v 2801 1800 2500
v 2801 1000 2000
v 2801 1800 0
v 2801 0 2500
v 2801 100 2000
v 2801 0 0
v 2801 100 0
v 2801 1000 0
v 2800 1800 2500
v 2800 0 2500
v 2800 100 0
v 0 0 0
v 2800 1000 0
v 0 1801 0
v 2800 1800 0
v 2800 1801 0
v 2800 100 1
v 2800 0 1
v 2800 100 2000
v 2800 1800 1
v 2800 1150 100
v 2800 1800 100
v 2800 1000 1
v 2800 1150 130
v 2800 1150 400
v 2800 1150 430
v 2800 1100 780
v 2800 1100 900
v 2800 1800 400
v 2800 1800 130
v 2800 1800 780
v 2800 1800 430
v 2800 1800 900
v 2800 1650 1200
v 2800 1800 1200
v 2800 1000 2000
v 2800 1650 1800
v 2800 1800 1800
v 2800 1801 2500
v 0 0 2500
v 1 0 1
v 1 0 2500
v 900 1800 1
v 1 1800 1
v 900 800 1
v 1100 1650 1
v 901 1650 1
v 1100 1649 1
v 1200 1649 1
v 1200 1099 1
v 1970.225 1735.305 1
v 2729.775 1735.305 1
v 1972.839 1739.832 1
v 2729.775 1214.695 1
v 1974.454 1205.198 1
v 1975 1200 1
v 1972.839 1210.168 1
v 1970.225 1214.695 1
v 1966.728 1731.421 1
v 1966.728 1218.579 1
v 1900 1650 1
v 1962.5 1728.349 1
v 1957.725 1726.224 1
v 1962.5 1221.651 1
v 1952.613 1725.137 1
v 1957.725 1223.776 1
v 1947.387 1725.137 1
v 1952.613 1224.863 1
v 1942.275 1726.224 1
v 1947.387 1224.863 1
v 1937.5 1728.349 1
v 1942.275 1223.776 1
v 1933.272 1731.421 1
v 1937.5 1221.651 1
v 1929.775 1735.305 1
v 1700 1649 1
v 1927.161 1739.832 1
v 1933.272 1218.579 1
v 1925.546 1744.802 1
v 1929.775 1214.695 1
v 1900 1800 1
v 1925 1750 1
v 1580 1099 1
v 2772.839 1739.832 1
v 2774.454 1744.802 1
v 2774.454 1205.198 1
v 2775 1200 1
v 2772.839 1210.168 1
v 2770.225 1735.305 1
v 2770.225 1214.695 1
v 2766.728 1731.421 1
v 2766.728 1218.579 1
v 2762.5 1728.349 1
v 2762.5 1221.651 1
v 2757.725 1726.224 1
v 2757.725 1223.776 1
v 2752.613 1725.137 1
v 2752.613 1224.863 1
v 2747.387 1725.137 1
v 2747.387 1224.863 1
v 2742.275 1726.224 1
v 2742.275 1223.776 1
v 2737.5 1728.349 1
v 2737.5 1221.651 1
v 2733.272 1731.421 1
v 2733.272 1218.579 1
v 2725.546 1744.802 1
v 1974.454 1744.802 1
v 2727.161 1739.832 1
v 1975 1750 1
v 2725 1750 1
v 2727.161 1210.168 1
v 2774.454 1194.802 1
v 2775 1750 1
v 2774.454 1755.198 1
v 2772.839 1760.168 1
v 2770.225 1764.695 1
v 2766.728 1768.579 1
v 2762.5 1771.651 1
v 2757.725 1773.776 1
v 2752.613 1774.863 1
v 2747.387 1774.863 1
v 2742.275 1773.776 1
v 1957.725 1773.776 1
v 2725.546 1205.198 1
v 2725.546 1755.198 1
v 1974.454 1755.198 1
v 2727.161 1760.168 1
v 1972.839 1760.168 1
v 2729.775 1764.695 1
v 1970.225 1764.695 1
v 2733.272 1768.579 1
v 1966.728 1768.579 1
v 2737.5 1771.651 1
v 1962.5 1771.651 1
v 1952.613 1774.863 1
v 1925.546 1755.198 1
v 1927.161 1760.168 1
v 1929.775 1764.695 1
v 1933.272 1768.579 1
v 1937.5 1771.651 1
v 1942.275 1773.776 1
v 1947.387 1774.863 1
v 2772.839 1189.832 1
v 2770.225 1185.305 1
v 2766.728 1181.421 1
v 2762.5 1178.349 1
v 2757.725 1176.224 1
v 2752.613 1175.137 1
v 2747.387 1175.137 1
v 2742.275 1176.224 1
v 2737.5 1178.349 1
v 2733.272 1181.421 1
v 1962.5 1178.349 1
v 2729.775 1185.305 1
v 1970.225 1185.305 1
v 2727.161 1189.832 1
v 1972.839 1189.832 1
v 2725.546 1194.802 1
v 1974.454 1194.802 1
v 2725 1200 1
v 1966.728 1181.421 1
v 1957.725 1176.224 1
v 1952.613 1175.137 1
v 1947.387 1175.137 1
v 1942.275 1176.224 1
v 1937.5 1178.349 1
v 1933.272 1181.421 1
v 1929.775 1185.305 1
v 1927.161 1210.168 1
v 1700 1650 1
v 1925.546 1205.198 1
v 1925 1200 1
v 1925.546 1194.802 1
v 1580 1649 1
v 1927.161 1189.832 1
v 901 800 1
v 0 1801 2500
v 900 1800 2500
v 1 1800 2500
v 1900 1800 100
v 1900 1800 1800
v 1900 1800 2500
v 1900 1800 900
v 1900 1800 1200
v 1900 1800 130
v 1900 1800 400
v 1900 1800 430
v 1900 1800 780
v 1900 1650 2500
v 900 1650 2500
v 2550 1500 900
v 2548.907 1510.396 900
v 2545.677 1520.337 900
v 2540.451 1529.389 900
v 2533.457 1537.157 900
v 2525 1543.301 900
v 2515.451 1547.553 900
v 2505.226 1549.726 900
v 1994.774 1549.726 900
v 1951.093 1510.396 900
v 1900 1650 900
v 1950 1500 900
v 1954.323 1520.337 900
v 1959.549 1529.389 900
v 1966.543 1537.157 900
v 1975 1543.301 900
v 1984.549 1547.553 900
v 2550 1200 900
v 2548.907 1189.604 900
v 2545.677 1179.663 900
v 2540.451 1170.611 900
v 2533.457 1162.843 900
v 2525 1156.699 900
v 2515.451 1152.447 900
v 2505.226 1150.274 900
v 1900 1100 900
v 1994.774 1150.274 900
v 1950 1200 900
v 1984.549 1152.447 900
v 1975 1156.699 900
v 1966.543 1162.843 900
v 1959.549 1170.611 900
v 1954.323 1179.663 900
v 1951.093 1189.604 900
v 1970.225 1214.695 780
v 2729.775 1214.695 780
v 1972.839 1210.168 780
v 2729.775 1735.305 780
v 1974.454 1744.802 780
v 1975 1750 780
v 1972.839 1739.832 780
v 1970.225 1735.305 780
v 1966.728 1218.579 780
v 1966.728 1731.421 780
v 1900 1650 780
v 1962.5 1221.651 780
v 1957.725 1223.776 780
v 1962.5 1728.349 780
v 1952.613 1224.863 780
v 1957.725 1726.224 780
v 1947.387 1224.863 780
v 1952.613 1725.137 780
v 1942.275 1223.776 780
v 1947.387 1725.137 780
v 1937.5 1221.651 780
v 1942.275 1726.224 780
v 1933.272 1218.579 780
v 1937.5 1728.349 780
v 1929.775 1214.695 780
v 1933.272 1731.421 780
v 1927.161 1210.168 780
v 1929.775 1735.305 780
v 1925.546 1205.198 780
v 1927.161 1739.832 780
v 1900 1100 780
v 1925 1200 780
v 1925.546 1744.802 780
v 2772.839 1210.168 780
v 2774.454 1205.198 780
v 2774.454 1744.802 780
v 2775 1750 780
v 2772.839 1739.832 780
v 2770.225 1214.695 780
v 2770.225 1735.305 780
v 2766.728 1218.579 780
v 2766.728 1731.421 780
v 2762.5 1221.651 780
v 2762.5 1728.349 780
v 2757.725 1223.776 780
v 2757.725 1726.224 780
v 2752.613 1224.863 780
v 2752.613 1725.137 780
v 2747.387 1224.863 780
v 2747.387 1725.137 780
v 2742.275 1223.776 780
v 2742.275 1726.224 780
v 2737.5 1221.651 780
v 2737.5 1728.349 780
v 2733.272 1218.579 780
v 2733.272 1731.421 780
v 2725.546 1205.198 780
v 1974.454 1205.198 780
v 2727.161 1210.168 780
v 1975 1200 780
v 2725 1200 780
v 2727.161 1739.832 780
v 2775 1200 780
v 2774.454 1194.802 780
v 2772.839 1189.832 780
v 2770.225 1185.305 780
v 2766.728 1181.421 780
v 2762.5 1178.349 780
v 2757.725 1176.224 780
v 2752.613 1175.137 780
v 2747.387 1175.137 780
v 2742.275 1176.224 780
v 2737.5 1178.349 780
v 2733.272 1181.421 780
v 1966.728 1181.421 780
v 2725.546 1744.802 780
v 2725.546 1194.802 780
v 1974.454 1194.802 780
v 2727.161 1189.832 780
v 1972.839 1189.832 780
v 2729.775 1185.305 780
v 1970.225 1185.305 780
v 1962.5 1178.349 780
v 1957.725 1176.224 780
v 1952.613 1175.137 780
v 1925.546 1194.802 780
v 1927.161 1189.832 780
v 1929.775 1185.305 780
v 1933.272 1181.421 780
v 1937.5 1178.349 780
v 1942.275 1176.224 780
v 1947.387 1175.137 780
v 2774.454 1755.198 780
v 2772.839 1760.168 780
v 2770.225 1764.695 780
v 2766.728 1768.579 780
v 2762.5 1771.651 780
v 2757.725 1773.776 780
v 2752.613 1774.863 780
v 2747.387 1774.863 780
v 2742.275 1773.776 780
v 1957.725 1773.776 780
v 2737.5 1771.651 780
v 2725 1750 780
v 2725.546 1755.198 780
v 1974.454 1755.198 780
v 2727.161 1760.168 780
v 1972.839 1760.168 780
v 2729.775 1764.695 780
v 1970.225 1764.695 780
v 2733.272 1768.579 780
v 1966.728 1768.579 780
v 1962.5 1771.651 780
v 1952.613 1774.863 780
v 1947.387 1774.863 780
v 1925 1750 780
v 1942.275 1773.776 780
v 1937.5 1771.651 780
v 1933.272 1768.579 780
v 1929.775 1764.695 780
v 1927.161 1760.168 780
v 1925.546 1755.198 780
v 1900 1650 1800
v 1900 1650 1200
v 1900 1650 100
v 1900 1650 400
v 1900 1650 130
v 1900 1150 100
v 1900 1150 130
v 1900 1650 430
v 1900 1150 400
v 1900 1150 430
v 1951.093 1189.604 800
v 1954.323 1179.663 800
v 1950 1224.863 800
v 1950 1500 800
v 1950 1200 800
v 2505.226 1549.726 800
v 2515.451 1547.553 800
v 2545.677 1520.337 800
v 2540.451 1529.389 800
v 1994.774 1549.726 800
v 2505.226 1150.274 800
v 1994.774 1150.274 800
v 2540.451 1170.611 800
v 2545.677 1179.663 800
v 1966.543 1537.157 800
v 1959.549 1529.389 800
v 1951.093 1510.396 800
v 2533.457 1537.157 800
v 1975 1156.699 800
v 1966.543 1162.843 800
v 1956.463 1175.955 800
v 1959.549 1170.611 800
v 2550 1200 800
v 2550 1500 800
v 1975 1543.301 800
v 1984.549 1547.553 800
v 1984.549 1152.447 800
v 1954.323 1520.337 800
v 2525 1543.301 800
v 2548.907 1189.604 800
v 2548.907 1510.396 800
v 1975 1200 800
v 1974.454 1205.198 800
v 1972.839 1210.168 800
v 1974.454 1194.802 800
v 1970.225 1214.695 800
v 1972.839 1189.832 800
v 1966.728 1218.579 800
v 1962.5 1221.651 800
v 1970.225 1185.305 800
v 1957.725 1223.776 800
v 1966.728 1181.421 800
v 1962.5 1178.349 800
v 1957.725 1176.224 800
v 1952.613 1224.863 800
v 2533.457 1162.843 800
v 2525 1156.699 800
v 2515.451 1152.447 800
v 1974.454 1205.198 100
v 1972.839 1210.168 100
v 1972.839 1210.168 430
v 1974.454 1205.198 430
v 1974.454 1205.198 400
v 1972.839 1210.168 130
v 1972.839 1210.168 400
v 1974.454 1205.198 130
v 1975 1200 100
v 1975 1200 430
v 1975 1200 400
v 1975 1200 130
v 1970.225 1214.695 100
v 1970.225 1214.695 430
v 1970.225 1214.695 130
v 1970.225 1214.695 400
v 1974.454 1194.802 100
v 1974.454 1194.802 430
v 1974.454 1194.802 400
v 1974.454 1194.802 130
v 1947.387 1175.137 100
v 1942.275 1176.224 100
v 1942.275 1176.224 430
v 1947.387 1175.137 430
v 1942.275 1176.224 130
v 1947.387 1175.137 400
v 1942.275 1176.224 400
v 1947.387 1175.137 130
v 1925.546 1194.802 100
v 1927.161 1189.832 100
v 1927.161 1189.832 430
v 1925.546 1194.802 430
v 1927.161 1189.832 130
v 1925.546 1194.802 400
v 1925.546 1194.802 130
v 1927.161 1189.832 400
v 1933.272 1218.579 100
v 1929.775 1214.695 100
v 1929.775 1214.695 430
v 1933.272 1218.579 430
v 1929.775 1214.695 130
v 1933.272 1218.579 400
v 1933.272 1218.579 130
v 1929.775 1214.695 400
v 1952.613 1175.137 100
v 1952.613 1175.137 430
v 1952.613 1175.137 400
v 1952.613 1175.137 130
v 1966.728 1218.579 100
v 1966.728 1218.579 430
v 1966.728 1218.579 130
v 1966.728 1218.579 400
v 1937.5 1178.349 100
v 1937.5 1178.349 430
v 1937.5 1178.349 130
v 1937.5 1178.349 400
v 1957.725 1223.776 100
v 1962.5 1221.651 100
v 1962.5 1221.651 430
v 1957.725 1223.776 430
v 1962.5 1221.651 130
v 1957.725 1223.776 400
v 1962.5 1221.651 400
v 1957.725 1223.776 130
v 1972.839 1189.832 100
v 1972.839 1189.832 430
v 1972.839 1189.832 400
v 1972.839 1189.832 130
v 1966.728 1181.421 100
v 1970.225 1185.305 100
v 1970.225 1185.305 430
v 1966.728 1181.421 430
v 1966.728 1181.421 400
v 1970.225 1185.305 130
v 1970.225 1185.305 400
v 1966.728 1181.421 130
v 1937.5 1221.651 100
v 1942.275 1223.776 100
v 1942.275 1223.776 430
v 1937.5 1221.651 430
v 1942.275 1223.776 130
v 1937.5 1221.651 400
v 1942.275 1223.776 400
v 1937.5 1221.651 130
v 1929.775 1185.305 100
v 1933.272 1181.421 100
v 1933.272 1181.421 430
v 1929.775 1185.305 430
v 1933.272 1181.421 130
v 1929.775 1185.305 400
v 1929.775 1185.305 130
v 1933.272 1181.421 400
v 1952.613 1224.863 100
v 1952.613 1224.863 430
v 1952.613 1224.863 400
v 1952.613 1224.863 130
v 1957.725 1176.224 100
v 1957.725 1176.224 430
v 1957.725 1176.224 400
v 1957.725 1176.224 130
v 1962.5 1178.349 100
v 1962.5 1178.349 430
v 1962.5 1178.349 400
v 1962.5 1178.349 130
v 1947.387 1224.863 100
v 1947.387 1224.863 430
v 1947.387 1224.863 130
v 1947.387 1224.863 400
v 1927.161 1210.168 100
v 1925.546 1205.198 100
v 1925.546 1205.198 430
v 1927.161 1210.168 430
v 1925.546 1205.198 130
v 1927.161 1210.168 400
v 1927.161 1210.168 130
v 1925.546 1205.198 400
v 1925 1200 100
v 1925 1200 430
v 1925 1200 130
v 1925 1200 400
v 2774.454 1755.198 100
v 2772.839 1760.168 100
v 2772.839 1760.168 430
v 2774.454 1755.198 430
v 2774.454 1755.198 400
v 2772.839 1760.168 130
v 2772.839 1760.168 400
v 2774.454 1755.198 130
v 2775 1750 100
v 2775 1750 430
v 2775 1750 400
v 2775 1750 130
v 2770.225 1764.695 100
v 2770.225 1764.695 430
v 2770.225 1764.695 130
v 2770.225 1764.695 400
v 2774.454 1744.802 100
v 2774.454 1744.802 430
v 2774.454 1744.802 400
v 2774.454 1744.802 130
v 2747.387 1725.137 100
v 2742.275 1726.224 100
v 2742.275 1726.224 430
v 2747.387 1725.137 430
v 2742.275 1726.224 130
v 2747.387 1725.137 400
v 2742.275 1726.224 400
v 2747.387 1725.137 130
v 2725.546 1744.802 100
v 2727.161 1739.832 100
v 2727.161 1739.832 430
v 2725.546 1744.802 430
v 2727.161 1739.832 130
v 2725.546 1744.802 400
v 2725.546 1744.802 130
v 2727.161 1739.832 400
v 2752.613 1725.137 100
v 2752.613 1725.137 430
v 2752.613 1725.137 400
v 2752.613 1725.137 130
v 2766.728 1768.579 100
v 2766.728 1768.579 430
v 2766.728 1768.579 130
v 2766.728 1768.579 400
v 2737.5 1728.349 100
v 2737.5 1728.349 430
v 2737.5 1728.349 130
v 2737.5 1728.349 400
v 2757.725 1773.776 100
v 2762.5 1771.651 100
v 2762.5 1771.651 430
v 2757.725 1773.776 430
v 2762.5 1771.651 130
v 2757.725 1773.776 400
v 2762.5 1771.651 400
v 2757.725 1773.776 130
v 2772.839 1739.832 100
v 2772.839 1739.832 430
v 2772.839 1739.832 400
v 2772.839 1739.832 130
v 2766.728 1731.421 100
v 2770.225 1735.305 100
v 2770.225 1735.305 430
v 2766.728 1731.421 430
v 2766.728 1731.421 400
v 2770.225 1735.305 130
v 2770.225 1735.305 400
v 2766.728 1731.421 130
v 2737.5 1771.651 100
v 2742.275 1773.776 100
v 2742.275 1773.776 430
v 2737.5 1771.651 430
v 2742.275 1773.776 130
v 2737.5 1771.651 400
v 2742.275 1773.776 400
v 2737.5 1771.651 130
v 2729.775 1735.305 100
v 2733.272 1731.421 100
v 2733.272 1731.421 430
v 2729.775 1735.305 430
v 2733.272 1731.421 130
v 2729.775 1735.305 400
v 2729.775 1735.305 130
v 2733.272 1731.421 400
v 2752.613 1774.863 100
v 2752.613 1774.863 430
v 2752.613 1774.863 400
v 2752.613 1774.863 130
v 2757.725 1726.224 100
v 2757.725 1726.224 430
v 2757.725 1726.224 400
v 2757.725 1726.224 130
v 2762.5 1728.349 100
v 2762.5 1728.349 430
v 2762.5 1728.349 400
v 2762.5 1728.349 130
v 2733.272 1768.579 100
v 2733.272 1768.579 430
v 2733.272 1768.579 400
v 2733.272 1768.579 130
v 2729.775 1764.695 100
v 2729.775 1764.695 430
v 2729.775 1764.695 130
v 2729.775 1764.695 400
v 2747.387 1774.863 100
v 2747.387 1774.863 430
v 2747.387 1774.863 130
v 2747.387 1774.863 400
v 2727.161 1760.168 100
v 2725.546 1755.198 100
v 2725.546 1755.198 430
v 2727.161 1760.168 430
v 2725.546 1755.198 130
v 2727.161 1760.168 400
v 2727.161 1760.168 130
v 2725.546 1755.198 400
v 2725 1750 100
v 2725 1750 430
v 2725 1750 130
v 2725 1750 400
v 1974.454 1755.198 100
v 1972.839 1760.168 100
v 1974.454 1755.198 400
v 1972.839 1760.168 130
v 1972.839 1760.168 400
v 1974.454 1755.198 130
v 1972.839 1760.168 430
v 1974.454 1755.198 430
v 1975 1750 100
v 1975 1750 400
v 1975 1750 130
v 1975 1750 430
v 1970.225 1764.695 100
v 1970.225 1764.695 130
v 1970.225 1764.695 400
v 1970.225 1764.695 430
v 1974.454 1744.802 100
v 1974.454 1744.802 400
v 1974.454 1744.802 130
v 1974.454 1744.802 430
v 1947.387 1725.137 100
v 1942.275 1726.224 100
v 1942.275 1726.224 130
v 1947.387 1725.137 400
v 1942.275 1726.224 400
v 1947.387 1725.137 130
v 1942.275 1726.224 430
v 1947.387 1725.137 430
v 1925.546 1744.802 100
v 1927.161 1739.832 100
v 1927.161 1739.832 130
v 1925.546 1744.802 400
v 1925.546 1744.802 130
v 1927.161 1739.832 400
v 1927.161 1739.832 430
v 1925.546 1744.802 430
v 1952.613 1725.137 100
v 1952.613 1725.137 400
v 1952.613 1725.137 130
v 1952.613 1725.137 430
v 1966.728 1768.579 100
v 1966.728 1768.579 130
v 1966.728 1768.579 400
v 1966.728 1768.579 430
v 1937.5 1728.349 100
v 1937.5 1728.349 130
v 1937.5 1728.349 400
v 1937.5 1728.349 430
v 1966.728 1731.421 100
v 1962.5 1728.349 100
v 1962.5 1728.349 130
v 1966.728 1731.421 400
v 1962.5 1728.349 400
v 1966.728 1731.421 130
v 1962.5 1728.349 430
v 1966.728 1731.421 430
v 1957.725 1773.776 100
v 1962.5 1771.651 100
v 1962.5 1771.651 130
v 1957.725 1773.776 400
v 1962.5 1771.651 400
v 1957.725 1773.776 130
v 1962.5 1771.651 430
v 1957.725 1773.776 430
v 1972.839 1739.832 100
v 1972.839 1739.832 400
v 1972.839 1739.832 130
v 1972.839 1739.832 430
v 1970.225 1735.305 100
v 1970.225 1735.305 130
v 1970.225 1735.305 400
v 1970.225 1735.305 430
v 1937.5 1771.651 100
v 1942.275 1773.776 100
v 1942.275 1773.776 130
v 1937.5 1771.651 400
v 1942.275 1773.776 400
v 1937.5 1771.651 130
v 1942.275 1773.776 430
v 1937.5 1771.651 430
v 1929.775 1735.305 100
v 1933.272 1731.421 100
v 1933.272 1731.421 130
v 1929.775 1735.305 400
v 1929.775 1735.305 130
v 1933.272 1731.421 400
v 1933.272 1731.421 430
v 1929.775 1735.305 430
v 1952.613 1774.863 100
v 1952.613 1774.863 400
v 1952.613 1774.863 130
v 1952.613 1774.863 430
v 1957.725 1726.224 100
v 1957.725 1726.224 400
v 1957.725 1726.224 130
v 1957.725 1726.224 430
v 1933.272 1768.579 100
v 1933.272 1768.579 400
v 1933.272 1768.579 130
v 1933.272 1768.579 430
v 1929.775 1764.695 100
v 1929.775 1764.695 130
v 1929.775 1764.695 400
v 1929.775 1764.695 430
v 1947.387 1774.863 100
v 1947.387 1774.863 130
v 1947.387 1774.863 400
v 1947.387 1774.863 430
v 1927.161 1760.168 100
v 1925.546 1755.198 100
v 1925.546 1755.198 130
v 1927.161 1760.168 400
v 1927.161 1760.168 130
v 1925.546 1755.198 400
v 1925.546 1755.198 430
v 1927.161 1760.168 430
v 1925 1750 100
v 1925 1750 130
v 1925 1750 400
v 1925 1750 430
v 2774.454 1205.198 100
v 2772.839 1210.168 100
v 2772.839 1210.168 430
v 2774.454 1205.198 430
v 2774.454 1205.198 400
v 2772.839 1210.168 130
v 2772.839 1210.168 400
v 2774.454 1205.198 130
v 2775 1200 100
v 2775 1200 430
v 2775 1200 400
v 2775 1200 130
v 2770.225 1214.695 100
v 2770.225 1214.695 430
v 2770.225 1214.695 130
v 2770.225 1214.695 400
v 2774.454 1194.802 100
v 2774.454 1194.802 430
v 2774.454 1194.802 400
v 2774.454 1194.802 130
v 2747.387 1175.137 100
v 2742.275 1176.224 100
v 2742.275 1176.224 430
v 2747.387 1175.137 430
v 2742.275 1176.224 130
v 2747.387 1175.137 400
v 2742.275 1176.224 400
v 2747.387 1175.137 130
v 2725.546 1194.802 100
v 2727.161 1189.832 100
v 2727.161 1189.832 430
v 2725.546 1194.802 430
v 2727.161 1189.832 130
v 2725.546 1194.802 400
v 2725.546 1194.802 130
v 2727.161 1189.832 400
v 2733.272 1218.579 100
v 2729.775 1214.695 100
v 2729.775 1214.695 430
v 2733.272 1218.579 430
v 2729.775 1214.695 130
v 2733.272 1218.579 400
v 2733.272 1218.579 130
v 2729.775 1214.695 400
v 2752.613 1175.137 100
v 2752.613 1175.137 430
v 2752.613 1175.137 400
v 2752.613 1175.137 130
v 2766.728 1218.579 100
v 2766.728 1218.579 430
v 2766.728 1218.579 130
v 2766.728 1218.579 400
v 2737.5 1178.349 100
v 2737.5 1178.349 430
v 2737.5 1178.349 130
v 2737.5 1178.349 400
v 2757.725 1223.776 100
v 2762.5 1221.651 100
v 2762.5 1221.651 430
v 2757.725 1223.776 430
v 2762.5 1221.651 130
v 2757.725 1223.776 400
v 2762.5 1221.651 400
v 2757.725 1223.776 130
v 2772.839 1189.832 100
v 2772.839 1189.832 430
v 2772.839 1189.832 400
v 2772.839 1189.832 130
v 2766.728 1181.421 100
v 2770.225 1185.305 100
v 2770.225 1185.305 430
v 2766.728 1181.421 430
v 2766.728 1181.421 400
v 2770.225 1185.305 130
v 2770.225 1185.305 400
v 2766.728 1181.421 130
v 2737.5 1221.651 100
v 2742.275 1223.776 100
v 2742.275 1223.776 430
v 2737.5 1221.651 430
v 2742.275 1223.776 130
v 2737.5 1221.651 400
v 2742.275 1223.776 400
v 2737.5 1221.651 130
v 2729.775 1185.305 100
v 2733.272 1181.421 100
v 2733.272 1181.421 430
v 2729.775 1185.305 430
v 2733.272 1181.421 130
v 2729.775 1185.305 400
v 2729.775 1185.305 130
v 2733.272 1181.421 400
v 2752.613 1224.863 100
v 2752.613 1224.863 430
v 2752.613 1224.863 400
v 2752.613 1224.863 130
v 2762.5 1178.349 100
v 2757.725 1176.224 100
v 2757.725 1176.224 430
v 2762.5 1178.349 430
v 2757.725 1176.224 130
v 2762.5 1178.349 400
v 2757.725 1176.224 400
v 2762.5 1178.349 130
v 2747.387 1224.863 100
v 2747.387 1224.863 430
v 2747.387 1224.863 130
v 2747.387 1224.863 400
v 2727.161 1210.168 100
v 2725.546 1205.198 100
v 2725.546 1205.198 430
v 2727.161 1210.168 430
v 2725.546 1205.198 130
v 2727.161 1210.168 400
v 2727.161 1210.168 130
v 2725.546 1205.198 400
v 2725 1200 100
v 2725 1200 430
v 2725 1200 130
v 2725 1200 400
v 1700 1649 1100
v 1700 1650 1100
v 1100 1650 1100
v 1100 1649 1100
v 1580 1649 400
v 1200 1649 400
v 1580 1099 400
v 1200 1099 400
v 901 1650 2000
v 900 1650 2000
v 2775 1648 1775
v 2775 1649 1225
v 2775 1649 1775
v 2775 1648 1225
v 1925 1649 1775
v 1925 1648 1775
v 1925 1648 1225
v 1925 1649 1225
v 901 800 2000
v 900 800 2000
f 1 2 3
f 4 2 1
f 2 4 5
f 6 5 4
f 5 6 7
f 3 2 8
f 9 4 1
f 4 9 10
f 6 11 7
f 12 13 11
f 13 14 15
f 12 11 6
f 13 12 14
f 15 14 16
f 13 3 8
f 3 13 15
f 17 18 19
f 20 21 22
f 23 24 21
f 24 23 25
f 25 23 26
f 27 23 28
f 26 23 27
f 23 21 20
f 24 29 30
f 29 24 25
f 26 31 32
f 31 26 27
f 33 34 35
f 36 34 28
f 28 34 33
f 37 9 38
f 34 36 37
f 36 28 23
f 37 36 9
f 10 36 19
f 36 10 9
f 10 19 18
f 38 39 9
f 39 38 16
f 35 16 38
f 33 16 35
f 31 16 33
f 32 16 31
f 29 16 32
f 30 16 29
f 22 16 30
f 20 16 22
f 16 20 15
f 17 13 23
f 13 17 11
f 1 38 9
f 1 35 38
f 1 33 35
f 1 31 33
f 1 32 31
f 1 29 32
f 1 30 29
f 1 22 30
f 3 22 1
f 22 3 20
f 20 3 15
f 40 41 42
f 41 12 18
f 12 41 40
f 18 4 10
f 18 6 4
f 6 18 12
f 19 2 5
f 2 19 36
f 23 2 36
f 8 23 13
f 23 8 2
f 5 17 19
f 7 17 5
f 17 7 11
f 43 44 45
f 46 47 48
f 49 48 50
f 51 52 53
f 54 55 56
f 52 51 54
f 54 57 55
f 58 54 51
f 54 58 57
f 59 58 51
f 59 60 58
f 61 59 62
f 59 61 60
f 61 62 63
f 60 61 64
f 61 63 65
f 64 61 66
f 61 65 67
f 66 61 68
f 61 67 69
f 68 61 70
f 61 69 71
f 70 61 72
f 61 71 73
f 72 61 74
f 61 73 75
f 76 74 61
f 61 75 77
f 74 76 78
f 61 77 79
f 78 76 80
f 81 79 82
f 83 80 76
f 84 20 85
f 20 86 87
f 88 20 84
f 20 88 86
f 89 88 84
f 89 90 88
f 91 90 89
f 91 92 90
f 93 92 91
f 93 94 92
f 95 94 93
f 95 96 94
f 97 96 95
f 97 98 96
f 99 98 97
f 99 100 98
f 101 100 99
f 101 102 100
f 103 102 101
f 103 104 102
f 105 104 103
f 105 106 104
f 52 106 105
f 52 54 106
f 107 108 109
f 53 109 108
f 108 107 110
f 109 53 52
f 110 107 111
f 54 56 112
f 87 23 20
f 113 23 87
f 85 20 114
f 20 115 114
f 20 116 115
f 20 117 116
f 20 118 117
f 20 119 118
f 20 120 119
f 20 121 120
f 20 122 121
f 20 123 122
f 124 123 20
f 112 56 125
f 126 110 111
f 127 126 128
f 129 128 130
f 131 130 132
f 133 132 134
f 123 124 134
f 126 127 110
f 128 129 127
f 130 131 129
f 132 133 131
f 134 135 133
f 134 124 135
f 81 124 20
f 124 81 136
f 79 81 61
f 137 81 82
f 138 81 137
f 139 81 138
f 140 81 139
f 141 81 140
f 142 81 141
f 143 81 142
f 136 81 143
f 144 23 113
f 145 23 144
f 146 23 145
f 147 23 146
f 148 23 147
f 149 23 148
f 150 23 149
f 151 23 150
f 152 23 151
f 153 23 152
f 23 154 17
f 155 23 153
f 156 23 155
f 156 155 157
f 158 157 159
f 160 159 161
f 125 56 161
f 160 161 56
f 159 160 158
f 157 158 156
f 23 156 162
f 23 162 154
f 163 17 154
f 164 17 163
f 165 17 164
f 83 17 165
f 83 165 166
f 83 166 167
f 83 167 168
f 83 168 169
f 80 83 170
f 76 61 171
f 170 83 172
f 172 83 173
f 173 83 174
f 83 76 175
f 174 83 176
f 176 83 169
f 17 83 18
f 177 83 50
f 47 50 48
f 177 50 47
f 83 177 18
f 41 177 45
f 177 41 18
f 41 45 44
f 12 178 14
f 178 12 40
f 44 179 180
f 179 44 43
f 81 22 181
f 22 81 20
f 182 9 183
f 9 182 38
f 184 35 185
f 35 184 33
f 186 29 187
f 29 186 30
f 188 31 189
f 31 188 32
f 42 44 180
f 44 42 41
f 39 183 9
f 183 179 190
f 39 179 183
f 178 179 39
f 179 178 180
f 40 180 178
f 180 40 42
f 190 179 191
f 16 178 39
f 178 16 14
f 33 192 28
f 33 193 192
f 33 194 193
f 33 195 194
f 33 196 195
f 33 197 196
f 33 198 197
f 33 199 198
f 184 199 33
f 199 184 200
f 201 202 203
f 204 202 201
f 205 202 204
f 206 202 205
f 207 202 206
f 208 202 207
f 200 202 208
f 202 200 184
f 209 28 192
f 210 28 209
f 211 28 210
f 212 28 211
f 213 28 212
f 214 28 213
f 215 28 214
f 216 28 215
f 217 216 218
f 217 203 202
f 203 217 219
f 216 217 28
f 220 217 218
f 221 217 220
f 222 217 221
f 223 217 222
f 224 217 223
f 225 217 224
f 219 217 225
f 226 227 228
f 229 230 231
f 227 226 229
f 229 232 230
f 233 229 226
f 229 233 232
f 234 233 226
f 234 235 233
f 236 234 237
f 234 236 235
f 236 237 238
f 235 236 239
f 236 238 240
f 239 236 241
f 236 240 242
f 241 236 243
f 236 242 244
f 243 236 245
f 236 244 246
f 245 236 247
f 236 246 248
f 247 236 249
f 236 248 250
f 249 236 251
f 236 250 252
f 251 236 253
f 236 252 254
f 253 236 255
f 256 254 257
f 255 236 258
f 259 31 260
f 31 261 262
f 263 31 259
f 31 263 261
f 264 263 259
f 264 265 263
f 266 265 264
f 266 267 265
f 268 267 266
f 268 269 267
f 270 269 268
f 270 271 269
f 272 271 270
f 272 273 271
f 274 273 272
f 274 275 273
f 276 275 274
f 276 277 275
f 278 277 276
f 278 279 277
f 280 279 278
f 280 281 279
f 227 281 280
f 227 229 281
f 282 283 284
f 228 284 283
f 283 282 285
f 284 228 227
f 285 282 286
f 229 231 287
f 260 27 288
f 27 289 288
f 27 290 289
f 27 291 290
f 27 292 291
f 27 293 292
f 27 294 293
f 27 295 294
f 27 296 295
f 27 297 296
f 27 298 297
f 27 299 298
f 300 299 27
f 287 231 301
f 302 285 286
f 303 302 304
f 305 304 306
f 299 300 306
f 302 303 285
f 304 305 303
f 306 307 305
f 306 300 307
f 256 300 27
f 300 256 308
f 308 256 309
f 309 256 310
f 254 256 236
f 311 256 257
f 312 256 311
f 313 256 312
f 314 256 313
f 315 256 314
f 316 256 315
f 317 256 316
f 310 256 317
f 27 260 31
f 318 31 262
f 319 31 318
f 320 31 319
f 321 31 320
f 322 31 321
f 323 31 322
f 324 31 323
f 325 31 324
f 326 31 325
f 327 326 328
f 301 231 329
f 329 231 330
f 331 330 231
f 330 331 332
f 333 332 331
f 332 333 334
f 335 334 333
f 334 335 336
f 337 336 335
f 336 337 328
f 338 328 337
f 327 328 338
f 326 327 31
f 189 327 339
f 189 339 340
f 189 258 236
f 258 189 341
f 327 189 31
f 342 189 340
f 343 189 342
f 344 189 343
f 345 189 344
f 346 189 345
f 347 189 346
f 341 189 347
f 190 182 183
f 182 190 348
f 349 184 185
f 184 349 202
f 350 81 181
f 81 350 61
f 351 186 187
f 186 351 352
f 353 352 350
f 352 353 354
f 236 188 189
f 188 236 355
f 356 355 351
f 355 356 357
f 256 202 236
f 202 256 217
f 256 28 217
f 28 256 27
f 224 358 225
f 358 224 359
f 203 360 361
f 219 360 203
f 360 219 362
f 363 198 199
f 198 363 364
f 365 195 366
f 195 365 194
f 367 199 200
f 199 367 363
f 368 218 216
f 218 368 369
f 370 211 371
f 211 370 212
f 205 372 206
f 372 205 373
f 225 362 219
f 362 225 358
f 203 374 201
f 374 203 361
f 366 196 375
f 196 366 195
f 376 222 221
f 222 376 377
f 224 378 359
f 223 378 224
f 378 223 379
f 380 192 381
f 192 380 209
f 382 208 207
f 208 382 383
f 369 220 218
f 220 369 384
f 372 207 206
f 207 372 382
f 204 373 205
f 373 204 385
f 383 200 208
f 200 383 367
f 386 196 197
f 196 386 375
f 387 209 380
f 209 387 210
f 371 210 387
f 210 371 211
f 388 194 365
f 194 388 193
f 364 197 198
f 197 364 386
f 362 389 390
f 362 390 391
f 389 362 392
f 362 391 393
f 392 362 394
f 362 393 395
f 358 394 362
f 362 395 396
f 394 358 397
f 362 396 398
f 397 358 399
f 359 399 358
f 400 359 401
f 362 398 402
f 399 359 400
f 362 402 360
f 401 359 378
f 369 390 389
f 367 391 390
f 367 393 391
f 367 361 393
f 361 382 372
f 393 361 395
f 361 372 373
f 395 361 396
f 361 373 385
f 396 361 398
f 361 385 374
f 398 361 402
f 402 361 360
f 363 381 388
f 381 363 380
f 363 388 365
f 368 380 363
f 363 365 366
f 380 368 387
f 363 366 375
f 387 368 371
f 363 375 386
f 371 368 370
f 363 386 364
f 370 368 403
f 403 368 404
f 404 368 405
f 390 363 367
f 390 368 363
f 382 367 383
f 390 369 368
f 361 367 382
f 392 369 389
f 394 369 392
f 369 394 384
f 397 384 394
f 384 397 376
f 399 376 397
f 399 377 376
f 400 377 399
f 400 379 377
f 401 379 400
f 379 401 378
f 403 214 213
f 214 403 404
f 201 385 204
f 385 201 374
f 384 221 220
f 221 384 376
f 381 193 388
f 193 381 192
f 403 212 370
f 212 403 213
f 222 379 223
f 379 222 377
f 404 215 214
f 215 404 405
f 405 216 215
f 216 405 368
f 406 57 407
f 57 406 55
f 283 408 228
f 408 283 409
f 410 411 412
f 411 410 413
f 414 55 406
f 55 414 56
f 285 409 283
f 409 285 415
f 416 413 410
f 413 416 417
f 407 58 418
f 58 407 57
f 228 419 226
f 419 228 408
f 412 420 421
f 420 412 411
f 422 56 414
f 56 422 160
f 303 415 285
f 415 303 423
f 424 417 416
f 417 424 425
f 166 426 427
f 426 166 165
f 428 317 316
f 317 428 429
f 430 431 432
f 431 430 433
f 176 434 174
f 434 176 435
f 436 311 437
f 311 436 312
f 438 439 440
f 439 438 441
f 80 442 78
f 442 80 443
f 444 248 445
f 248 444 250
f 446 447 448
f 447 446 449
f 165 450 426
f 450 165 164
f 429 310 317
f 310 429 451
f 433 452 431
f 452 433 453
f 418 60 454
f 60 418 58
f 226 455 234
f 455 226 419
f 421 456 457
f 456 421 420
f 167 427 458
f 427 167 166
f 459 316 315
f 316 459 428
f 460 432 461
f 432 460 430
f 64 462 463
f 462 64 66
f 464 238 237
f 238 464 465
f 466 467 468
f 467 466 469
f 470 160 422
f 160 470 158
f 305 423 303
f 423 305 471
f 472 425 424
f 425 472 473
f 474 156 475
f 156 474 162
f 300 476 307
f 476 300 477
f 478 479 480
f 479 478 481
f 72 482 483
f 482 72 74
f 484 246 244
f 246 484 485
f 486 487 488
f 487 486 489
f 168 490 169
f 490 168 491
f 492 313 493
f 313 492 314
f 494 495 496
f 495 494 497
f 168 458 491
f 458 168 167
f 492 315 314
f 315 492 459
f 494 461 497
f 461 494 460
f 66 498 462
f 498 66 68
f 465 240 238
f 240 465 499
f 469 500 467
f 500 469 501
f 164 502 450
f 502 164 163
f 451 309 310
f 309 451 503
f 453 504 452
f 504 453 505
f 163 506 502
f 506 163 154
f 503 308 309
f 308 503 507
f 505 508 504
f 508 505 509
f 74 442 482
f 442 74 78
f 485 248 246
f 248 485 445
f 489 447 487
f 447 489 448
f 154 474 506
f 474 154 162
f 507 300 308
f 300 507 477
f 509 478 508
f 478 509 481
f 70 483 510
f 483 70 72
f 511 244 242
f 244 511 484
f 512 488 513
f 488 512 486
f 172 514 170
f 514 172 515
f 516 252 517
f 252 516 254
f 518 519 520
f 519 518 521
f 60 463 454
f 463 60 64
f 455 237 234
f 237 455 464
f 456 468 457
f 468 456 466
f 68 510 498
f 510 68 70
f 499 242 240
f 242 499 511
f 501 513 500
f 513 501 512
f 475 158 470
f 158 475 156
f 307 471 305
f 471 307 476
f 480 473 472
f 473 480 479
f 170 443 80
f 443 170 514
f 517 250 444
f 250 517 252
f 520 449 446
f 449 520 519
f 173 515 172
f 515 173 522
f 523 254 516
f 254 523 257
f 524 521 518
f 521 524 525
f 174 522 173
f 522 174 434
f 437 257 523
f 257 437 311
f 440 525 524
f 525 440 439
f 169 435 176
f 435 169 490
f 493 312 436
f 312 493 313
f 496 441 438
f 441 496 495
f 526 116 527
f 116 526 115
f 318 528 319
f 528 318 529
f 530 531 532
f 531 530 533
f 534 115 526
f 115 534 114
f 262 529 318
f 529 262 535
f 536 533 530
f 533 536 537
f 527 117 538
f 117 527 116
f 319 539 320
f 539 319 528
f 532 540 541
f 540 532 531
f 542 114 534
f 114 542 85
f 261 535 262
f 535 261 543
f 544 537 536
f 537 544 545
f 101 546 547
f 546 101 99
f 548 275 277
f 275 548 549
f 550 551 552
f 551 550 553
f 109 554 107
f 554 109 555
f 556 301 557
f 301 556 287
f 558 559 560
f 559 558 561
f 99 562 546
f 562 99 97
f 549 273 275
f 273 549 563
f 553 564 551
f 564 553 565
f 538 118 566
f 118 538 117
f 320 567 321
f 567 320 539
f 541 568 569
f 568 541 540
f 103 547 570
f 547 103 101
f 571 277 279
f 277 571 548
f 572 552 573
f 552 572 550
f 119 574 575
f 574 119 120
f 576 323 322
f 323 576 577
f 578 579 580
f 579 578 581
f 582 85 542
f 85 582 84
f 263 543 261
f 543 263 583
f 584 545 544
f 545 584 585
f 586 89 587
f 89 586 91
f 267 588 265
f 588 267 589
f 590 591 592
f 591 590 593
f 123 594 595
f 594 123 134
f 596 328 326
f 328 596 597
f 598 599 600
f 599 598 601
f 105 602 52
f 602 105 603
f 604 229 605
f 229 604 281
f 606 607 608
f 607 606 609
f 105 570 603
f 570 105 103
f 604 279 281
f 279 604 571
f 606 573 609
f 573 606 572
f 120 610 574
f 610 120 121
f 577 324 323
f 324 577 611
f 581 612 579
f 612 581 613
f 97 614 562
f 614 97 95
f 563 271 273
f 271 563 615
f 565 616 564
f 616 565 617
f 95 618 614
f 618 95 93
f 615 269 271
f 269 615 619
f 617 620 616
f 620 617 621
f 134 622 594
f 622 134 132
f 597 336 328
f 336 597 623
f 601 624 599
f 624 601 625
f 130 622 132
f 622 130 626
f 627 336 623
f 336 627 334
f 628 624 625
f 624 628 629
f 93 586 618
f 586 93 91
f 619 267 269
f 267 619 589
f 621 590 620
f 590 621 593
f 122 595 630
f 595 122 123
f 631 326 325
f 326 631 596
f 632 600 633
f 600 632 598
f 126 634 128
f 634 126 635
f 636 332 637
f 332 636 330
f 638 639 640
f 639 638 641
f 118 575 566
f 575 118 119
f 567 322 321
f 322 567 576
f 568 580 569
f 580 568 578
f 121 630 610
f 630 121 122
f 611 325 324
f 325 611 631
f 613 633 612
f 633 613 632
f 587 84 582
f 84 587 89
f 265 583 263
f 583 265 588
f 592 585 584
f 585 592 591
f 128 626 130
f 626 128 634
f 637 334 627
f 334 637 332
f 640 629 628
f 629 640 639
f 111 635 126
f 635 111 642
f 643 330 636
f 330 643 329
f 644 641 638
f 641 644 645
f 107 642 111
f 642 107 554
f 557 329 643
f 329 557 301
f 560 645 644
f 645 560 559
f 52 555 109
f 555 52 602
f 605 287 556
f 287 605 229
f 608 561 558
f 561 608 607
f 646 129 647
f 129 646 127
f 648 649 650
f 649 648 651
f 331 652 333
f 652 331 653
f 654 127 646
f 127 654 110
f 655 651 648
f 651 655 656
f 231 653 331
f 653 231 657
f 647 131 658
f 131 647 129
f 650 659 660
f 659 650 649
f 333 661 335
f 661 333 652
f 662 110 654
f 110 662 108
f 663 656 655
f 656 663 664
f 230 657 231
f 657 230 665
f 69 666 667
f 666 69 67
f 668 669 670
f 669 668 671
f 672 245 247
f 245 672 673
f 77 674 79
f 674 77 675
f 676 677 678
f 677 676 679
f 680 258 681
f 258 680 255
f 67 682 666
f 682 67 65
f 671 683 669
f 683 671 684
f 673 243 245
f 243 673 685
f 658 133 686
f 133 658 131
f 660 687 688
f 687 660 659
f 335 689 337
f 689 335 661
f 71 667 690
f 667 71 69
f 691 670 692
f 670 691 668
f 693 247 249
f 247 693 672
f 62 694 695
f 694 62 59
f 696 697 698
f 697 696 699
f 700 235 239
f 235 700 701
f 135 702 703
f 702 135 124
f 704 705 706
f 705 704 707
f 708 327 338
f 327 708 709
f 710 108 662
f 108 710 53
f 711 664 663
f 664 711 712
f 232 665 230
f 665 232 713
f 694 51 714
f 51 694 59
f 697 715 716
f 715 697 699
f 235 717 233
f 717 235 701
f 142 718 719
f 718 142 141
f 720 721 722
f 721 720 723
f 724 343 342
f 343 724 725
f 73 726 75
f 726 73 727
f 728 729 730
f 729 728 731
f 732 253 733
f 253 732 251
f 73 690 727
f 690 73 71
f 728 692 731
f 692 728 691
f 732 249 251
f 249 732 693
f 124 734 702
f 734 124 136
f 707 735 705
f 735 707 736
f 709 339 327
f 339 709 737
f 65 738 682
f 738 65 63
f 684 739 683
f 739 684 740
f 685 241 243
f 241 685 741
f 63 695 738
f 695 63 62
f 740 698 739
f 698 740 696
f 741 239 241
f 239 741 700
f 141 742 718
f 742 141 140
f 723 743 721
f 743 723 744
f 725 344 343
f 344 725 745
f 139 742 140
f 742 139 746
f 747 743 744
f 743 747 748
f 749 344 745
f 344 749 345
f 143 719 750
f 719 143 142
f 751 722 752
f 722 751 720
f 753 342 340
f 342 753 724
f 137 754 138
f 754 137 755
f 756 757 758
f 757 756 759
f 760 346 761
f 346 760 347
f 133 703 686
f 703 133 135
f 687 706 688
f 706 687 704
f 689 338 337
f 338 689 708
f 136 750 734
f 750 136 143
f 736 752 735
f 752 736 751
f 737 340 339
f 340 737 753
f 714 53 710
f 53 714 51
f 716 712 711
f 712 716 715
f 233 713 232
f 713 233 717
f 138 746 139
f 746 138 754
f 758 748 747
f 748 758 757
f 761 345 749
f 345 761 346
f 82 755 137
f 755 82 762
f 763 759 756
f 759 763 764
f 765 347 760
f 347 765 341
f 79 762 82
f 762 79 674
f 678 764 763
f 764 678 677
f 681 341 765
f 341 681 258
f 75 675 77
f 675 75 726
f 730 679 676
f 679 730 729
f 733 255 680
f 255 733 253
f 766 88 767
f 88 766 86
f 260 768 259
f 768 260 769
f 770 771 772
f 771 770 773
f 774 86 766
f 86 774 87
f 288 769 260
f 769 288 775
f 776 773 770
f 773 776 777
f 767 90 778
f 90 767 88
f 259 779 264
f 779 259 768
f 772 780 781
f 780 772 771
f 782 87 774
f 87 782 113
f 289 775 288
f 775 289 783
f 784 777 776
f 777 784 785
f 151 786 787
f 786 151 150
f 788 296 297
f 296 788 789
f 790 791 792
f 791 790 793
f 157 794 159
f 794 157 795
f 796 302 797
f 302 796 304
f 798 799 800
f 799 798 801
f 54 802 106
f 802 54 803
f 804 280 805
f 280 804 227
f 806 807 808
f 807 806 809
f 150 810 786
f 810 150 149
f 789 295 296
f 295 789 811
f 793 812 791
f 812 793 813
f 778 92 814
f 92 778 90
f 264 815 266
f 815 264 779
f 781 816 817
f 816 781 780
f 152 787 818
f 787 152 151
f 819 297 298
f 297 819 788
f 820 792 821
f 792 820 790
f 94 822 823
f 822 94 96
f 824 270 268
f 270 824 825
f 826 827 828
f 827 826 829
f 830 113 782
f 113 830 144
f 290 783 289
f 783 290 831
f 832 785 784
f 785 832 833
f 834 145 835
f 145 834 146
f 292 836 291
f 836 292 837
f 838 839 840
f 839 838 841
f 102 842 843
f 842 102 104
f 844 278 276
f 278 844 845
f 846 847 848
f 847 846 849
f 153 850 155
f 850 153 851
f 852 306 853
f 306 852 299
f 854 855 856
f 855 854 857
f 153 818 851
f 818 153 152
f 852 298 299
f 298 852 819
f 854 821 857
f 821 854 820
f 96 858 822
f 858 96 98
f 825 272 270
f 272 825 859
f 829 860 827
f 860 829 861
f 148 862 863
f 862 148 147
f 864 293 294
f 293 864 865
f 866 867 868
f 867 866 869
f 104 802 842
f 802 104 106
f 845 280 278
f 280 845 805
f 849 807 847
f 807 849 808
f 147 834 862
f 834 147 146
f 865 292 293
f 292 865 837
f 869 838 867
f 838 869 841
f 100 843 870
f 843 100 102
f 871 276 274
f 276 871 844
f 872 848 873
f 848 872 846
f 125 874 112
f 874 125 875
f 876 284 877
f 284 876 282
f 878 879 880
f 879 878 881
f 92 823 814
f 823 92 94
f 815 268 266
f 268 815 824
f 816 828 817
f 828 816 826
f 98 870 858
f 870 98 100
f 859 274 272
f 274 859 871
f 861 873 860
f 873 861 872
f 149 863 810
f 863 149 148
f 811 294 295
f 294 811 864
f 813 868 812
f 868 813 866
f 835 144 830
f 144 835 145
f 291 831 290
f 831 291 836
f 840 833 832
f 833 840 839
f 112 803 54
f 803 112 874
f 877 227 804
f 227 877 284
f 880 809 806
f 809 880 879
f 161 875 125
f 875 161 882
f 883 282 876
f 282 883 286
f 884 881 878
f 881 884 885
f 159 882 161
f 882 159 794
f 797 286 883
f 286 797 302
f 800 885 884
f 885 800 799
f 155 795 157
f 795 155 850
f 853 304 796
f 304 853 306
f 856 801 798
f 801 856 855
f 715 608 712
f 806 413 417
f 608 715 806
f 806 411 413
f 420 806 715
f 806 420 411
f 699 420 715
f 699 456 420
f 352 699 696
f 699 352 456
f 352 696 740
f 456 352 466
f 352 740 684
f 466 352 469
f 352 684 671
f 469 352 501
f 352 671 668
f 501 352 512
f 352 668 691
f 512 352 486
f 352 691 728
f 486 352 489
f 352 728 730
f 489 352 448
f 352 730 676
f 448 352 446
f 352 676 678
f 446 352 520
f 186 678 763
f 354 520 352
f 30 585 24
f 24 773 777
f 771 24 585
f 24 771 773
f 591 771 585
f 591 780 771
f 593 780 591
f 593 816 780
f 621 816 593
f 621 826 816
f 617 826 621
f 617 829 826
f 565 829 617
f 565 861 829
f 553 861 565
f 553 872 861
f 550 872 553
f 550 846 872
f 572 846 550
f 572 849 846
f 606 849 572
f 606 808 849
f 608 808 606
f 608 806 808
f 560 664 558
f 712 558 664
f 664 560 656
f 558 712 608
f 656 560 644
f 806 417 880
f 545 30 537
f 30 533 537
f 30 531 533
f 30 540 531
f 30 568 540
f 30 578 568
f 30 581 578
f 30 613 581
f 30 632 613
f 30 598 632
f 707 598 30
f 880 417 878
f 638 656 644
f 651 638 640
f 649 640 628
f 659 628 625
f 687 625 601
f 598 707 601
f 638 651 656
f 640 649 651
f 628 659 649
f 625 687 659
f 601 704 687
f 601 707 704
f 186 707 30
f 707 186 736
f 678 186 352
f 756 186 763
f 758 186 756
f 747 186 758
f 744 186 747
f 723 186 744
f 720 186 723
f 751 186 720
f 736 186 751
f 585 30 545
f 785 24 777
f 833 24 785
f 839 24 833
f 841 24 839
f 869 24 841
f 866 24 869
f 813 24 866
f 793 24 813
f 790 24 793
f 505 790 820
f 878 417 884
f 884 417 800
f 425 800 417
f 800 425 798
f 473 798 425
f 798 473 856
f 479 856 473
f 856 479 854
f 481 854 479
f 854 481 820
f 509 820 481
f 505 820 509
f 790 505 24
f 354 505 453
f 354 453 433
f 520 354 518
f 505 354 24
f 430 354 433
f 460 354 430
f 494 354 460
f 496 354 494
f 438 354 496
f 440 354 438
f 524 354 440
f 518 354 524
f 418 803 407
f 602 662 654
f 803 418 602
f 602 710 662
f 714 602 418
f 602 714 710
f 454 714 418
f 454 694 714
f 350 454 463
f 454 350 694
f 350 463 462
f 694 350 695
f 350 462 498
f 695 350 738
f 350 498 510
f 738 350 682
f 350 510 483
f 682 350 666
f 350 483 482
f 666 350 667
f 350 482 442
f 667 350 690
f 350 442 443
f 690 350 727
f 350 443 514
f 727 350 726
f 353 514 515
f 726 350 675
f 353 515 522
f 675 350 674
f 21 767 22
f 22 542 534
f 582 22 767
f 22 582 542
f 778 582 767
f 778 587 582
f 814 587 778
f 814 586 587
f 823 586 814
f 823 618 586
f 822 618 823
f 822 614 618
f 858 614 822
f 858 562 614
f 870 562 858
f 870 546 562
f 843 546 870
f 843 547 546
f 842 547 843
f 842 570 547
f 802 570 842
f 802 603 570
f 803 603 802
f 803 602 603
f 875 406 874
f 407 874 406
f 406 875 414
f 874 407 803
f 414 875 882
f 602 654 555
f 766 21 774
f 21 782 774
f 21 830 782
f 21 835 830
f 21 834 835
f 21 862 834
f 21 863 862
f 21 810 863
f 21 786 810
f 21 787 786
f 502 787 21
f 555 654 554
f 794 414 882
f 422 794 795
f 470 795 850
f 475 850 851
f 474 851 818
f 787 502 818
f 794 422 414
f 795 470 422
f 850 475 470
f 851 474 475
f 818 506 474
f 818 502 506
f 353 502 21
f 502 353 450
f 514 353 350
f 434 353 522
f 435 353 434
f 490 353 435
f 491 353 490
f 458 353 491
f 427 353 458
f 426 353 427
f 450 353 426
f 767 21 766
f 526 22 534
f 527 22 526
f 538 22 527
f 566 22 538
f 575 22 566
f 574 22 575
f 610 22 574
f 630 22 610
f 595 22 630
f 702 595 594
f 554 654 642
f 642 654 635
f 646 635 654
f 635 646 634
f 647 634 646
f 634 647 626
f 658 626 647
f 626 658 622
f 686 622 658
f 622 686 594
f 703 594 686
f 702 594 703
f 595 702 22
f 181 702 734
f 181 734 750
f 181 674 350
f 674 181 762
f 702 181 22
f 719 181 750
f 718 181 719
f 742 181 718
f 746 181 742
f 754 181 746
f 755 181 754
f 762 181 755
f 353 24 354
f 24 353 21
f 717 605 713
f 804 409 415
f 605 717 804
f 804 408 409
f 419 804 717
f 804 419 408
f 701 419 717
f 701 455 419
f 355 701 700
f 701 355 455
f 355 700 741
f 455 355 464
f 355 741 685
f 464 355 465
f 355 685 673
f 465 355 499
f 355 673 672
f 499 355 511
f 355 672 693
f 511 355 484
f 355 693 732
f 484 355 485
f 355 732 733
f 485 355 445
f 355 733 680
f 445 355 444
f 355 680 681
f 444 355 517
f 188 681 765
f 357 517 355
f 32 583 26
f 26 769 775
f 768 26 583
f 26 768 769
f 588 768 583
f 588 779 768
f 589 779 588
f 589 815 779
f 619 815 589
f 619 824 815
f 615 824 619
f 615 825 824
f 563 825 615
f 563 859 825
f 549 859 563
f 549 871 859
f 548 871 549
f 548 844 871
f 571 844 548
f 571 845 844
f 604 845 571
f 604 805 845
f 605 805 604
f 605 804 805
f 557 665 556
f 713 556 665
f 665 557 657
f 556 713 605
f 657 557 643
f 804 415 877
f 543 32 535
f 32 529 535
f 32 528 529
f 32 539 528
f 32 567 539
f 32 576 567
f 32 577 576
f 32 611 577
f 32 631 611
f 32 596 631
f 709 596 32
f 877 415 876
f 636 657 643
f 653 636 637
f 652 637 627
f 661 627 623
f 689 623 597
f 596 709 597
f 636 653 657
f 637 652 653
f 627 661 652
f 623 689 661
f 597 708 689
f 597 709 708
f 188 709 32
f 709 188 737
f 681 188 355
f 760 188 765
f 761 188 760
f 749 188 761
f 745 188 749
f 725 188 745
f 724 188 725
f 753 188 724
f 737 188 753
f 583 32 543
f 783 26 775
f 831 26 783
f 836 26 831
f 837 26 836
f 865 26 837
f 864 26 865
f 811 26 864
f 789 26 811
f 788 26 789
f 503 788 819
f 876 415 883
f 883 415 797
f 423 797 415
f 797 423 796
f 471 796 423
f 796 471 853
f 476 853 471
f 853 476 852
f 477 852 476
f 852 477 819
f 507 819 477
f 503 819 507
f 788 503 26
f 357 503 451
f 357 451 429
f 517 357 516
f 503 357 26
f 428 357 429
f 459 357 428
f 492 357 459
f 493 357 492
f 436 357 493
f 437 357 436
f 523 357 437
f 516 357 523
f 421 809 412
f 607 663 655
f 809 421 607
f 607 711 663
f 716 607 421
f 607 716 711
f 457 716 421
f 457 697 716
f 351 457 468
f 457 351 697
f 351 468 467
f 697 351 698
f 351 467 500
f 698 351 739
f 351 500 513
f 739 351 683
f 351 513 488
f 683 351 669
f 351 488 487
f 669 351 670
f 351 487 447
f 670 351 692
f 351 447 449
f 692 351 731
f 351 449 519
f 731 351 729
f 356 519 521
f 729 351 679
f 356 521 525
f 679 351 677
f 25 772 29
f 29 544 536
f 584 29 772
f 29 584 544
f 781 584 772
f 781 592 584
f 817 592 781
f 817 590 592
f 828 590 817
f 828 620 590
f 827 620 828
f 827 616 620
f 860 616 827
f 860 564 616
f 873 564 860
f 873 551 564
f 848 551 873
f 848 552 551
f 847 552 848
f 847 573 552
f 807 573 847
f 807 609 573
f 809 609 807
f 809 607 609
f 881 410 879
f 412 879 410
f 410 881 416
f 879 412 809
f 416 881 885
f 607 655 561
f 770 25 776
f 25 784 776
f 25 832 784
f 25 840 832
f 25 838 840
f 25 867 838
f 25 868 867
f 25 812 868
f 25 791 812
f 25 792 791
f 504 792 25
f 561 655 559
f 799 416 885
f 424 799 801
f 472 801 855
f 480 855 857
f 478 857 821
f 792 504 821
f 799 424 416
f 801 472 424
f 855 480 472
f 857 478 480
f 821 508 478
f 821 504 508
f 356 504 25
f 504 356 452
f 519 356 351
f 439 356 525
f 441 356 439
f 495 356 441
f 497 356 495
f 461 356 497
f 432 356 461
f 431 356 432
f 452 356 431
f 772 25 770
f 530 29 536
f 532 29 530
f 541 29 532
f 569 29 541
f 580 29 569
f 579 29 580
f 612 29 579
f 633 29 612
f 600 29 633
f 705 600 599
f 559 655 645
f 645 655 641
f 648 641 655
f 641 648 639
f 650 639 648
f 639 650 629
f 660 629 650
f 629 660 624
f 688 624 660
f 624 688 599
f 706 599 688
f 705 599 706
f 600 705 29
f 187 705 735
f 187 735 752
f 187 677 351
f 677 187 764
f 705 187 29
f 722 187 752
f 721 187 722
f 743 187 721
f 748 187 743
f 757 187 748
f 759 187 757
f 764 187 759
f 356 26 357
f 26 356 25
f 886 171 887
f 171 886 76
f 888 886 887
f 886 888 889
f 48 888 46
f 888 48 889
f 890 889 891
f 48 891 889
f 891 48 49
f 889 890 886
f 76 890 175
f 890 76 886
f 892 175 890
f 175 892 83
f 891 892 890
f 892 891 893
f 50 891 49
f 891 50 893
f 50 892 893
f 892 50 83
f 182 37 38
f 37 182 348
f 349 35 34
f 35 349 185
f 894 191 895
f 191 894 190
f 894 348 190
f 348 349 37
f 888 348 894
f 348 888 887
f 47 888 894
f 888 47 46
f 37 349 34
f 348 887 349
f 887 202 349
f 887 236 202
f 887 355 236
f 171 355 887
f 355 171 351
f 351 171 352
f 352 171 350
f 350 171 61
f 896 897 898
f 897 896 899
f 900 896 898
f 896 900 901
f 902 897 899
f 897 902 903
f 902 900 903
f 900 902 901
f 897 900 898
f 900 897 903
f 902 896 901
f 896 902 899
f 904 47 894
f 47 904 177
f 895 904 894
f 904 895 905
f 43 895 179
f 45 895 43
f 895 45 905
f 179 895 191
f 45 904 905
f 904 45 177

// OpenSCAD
X = 2800; // 2.8m
Y = 1800; // 1.8m
Z = 2500; //2.5m

module room() {
//floor 

color([0.9,0.9,0.9]) { 
cube([X, Y, 1]);
cube ([1,Y, Z]);
translate([0,Y,0]) cube ([X,1, Z]);
    

// door 
translate([X,0,0]) 
        difference(){
        cube ([1,Y, Z]);
        translate ([-1,100,0]) cube ([10,900, 2000]);
        }

}

// shower glass
GX = 1000;
color([99/255, 227/255, 225/255, 0.3]) 
translate([900,Y-GX,0]) cube ([1,GX, 2000]);

MX = 1800;
MY = 150;
MZ = 1200;
color([0.9,0.9,0.9]) {
    
// mask 130 x 1800 x 1200

//translate([X-MX,Y-MY,0]) cube([MX,MY,MZ]);

// water mask

M2X = 1000;
M2Y = 150;
M2Z = 2500;
translate([900,Y-M2Y,0]) cube([M2X,M2Y,M2Z]);
}

// sink

SX = 900;
SY = 550+150; //700
SZ = 900;
translate([1900,Y-SY,0]) 
sink(SX,SY,SZ);

//wc

WX = 600;
WY = 150;
WZ = 1100;

WX1=380;
WY1 = 550;
WZ1 = 400;

translate([1100, Y-WY-1,0]) {
cube([WX,WY,WZ]);
translate([100,-WY1,0]) cube([WX1,WY1,WZ1]);
}

// cabinet 

//CX = 600;
CY = 150;
CZ = 600;
translate([X-SX,Y-CY,900+300]) 
{
    cube([SX,CY,CZ]);
    color([99/255, 227/255, 225/255, 0.3]) 
    translate([25,-2,25])cube([SX-50,1,CZ-50]);
}

}


module sink(x,y,z){
    //cube([x,y,z]);
    
    sr = 50; 
    sz = 100;
    
    // legs 
    translate([50,100,0]) cylinder(d=50,h=800);
    translate([x-50,y-50,0]) cylinder(d=50,h=800);
    translate([50,y-50,0]) cylinder(d=50,h=800);
    translate([x-50,100,0]) cylinder(d=50,h=800);
    // body 
    
    translate([0,50,100]) cube([x,y-50,30]);
    
    translate([0,50,400]) cube([x,y-50,30]);
    
    // top
    difference(){
        translate([0,0,z-sz*1.2])
        cube([x,y,sz*1.2]);
        
        translate([0,0,z-sz])
        minkowski(){
        translate([sr,sr,0])cylinder(r=sr,h=sz);
        translate([sr,sr,0])cube([600-2*sr,400-2*sr,sz]);
        }
    }
    
}

//sink(900,700,900);
room();
